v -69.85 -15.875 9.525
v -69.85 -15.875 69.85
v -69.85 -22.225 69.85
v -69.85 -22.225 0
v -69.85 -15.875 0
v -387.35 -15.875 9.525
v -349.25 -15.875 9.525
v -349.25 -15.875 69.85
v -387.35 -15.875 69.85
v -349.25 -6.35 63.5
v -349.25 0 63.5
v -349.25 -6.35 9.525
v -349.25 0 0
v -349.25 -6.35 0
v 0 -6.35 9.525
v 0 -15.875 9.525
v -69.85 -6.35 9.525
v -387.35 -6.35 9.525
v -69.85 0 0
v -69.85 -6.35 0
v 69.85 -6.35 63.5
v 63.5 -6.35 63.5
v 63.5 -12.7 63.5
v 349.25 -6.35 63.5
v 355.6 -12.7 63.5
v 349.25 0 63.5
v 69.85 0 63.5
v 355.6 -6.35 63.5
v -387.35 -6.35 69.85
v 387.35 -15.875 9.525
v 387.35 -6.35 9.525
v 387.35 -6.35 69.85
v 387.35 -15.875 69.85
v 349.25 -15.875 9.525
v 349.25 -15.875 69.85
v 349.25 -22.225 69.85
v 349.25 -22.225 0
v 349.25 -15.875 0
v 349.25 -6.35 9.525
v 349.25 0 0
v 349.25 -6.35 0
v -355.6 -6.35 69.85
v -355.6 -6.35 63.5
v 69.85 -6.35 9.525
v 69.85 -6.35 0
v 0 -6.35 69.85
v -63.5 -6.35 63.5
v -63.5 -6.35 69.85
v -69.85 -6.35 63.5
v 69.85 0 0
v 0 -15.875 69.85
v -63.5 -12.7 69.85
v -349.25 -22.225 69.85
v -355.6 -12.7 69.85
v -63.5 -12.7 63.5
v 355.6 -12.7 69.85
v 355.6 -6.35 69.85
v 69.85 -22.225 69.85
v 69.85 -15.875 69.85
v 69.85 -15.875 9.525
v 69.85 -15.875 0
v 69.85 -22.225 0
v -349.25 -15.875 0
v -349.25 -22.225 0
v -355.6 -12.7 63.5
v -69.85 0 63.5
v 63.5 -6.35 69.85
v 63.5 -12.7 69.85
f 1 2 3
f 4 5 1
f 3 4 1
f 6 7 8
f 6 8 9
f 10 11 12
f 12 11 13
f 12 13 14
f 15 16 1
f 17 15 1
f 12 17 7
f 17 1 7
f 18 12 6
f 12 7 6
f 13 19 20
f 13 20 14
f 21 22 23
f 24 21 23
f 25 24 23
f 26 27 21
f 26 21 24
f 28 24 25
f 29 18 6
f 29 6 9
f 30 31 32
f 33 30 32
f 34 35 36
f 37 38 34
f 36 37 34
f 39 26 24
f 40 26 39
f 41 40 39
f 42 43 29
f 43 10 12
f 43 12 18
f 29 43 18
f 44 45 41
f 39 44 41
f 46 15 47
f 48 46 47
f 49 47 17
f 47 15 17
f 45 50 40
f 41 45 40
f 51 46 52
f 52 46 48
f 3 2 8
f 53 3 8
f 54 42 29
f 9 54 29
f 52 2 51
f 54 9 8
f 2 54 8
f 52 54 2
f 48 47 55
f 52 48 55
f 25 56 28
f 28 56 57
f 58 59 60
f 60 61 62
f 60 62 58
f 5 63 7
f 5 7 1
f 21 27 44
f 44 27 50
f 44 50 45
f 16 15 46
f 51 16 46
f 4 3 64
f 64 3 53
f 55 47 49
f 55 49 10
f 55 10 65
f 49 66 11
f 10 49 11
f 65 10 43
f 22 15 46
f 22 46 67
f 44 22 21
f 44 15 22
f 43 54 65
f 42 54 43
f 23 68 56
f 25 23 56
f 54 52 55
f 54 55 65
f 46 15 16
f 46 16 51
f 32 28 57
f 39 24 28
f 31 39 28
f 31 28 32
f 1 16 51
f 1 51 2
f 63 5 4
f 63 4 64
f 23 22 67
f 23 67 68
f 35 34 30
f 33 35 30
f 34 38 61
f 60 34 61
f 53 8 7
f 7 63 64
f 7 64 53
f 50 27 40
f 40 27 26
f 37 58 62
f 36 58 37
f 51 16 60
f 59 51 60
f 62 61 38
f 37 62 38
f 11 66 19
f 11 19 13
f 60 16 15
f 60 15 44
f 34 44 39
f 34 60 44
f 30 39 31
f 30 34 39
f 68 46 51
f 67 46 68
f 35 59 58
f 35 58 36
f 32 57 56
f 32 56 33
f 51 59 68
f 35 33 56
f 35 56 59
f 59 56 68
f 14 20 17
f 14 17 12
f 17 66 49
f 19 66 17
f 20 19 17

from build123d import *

# Parameters (mm, degrees)
F0_W     = 387.35
F0_H     = 69.85
F1_DEPTH = 22.225
F2_W     = 69.85
F2_H     = 6.35
F2_W_2   = 38.1
F3_DEPTH = 69.85
F2_H_2   = 9.525
F2_W_3   = 279.4
F4_DEPTH = 9.525
F6_DEPTH = 6.35


with BuildPart() as f1:
    # F0 (on Front) → F1 (new body)
    with BuildSketch(Plane.XZ):
        with Locations((193.675, 34.925)):
            Rectangle(F0_W, F0_H)
    extrude(amount=F1_DEPTH)

    # F2 (on face) → F3 (cut, through all)
    with BuildSketch(Plane(origin=(0, 0, 0), x_dir=(1, 0, 0), z_dir=(0, 0, -1))):
        with Locations((34.925, 19.05)):
            Rectangle(F2_W, F2_H)
        with Locations((34.925, 3.175)):
            Rectangle(F2_W, F2_H)
        with Locations((368.3, 19.05)):
            Rectangle(F2_W_2, F2_H)
        with Locations((368.3, 3.175)):
            Rectangle(F2_W_2, F2_H)
    extrude(amount=-F3_DEPTH, mode=Mode.SUBTRACT)

    # F2 (on face) → F4 (cut)
    with BuildSketch(Plane(origin=(0, 0, 0), x_dir=(1, 0, 0), z_dir=(0, 0, -1))):
        with Locations((34.925, 11.1125)):
            Rectangle(F2_W, F2_H_2)
        with Locations((209.55, 11.1125)):
            Rectangle(F2_W_3, F2_H_2)
        with Locations((368.3, 11.1125)):
            Rectangle(F2_W_2, F2_H_2)
    extrude(amount=-F4_DEPTH, mode=Mode.SUBTRACT)

    # F5 (on face) → F6 (cut)
    with BuildSketch(Plane.XY.offset(69.85)):
        Polygon((349.25, 0), (69.85, 0), (69.85, -6.35), (63.5, -6.35), (63.5, -12.7), (355.6, -12.7), (355.6, -6.35), (349.25, -6.35), align=None)
    extrude(amount=-F6_DEPTH, mode=Mode.SUBTRACT)


with BuildPart() as f7_1:
    # F7: instance of F1
    add(f1.part.mirror(Plane.YZ))


solid = Compound([f1.part, f7_1.part])
